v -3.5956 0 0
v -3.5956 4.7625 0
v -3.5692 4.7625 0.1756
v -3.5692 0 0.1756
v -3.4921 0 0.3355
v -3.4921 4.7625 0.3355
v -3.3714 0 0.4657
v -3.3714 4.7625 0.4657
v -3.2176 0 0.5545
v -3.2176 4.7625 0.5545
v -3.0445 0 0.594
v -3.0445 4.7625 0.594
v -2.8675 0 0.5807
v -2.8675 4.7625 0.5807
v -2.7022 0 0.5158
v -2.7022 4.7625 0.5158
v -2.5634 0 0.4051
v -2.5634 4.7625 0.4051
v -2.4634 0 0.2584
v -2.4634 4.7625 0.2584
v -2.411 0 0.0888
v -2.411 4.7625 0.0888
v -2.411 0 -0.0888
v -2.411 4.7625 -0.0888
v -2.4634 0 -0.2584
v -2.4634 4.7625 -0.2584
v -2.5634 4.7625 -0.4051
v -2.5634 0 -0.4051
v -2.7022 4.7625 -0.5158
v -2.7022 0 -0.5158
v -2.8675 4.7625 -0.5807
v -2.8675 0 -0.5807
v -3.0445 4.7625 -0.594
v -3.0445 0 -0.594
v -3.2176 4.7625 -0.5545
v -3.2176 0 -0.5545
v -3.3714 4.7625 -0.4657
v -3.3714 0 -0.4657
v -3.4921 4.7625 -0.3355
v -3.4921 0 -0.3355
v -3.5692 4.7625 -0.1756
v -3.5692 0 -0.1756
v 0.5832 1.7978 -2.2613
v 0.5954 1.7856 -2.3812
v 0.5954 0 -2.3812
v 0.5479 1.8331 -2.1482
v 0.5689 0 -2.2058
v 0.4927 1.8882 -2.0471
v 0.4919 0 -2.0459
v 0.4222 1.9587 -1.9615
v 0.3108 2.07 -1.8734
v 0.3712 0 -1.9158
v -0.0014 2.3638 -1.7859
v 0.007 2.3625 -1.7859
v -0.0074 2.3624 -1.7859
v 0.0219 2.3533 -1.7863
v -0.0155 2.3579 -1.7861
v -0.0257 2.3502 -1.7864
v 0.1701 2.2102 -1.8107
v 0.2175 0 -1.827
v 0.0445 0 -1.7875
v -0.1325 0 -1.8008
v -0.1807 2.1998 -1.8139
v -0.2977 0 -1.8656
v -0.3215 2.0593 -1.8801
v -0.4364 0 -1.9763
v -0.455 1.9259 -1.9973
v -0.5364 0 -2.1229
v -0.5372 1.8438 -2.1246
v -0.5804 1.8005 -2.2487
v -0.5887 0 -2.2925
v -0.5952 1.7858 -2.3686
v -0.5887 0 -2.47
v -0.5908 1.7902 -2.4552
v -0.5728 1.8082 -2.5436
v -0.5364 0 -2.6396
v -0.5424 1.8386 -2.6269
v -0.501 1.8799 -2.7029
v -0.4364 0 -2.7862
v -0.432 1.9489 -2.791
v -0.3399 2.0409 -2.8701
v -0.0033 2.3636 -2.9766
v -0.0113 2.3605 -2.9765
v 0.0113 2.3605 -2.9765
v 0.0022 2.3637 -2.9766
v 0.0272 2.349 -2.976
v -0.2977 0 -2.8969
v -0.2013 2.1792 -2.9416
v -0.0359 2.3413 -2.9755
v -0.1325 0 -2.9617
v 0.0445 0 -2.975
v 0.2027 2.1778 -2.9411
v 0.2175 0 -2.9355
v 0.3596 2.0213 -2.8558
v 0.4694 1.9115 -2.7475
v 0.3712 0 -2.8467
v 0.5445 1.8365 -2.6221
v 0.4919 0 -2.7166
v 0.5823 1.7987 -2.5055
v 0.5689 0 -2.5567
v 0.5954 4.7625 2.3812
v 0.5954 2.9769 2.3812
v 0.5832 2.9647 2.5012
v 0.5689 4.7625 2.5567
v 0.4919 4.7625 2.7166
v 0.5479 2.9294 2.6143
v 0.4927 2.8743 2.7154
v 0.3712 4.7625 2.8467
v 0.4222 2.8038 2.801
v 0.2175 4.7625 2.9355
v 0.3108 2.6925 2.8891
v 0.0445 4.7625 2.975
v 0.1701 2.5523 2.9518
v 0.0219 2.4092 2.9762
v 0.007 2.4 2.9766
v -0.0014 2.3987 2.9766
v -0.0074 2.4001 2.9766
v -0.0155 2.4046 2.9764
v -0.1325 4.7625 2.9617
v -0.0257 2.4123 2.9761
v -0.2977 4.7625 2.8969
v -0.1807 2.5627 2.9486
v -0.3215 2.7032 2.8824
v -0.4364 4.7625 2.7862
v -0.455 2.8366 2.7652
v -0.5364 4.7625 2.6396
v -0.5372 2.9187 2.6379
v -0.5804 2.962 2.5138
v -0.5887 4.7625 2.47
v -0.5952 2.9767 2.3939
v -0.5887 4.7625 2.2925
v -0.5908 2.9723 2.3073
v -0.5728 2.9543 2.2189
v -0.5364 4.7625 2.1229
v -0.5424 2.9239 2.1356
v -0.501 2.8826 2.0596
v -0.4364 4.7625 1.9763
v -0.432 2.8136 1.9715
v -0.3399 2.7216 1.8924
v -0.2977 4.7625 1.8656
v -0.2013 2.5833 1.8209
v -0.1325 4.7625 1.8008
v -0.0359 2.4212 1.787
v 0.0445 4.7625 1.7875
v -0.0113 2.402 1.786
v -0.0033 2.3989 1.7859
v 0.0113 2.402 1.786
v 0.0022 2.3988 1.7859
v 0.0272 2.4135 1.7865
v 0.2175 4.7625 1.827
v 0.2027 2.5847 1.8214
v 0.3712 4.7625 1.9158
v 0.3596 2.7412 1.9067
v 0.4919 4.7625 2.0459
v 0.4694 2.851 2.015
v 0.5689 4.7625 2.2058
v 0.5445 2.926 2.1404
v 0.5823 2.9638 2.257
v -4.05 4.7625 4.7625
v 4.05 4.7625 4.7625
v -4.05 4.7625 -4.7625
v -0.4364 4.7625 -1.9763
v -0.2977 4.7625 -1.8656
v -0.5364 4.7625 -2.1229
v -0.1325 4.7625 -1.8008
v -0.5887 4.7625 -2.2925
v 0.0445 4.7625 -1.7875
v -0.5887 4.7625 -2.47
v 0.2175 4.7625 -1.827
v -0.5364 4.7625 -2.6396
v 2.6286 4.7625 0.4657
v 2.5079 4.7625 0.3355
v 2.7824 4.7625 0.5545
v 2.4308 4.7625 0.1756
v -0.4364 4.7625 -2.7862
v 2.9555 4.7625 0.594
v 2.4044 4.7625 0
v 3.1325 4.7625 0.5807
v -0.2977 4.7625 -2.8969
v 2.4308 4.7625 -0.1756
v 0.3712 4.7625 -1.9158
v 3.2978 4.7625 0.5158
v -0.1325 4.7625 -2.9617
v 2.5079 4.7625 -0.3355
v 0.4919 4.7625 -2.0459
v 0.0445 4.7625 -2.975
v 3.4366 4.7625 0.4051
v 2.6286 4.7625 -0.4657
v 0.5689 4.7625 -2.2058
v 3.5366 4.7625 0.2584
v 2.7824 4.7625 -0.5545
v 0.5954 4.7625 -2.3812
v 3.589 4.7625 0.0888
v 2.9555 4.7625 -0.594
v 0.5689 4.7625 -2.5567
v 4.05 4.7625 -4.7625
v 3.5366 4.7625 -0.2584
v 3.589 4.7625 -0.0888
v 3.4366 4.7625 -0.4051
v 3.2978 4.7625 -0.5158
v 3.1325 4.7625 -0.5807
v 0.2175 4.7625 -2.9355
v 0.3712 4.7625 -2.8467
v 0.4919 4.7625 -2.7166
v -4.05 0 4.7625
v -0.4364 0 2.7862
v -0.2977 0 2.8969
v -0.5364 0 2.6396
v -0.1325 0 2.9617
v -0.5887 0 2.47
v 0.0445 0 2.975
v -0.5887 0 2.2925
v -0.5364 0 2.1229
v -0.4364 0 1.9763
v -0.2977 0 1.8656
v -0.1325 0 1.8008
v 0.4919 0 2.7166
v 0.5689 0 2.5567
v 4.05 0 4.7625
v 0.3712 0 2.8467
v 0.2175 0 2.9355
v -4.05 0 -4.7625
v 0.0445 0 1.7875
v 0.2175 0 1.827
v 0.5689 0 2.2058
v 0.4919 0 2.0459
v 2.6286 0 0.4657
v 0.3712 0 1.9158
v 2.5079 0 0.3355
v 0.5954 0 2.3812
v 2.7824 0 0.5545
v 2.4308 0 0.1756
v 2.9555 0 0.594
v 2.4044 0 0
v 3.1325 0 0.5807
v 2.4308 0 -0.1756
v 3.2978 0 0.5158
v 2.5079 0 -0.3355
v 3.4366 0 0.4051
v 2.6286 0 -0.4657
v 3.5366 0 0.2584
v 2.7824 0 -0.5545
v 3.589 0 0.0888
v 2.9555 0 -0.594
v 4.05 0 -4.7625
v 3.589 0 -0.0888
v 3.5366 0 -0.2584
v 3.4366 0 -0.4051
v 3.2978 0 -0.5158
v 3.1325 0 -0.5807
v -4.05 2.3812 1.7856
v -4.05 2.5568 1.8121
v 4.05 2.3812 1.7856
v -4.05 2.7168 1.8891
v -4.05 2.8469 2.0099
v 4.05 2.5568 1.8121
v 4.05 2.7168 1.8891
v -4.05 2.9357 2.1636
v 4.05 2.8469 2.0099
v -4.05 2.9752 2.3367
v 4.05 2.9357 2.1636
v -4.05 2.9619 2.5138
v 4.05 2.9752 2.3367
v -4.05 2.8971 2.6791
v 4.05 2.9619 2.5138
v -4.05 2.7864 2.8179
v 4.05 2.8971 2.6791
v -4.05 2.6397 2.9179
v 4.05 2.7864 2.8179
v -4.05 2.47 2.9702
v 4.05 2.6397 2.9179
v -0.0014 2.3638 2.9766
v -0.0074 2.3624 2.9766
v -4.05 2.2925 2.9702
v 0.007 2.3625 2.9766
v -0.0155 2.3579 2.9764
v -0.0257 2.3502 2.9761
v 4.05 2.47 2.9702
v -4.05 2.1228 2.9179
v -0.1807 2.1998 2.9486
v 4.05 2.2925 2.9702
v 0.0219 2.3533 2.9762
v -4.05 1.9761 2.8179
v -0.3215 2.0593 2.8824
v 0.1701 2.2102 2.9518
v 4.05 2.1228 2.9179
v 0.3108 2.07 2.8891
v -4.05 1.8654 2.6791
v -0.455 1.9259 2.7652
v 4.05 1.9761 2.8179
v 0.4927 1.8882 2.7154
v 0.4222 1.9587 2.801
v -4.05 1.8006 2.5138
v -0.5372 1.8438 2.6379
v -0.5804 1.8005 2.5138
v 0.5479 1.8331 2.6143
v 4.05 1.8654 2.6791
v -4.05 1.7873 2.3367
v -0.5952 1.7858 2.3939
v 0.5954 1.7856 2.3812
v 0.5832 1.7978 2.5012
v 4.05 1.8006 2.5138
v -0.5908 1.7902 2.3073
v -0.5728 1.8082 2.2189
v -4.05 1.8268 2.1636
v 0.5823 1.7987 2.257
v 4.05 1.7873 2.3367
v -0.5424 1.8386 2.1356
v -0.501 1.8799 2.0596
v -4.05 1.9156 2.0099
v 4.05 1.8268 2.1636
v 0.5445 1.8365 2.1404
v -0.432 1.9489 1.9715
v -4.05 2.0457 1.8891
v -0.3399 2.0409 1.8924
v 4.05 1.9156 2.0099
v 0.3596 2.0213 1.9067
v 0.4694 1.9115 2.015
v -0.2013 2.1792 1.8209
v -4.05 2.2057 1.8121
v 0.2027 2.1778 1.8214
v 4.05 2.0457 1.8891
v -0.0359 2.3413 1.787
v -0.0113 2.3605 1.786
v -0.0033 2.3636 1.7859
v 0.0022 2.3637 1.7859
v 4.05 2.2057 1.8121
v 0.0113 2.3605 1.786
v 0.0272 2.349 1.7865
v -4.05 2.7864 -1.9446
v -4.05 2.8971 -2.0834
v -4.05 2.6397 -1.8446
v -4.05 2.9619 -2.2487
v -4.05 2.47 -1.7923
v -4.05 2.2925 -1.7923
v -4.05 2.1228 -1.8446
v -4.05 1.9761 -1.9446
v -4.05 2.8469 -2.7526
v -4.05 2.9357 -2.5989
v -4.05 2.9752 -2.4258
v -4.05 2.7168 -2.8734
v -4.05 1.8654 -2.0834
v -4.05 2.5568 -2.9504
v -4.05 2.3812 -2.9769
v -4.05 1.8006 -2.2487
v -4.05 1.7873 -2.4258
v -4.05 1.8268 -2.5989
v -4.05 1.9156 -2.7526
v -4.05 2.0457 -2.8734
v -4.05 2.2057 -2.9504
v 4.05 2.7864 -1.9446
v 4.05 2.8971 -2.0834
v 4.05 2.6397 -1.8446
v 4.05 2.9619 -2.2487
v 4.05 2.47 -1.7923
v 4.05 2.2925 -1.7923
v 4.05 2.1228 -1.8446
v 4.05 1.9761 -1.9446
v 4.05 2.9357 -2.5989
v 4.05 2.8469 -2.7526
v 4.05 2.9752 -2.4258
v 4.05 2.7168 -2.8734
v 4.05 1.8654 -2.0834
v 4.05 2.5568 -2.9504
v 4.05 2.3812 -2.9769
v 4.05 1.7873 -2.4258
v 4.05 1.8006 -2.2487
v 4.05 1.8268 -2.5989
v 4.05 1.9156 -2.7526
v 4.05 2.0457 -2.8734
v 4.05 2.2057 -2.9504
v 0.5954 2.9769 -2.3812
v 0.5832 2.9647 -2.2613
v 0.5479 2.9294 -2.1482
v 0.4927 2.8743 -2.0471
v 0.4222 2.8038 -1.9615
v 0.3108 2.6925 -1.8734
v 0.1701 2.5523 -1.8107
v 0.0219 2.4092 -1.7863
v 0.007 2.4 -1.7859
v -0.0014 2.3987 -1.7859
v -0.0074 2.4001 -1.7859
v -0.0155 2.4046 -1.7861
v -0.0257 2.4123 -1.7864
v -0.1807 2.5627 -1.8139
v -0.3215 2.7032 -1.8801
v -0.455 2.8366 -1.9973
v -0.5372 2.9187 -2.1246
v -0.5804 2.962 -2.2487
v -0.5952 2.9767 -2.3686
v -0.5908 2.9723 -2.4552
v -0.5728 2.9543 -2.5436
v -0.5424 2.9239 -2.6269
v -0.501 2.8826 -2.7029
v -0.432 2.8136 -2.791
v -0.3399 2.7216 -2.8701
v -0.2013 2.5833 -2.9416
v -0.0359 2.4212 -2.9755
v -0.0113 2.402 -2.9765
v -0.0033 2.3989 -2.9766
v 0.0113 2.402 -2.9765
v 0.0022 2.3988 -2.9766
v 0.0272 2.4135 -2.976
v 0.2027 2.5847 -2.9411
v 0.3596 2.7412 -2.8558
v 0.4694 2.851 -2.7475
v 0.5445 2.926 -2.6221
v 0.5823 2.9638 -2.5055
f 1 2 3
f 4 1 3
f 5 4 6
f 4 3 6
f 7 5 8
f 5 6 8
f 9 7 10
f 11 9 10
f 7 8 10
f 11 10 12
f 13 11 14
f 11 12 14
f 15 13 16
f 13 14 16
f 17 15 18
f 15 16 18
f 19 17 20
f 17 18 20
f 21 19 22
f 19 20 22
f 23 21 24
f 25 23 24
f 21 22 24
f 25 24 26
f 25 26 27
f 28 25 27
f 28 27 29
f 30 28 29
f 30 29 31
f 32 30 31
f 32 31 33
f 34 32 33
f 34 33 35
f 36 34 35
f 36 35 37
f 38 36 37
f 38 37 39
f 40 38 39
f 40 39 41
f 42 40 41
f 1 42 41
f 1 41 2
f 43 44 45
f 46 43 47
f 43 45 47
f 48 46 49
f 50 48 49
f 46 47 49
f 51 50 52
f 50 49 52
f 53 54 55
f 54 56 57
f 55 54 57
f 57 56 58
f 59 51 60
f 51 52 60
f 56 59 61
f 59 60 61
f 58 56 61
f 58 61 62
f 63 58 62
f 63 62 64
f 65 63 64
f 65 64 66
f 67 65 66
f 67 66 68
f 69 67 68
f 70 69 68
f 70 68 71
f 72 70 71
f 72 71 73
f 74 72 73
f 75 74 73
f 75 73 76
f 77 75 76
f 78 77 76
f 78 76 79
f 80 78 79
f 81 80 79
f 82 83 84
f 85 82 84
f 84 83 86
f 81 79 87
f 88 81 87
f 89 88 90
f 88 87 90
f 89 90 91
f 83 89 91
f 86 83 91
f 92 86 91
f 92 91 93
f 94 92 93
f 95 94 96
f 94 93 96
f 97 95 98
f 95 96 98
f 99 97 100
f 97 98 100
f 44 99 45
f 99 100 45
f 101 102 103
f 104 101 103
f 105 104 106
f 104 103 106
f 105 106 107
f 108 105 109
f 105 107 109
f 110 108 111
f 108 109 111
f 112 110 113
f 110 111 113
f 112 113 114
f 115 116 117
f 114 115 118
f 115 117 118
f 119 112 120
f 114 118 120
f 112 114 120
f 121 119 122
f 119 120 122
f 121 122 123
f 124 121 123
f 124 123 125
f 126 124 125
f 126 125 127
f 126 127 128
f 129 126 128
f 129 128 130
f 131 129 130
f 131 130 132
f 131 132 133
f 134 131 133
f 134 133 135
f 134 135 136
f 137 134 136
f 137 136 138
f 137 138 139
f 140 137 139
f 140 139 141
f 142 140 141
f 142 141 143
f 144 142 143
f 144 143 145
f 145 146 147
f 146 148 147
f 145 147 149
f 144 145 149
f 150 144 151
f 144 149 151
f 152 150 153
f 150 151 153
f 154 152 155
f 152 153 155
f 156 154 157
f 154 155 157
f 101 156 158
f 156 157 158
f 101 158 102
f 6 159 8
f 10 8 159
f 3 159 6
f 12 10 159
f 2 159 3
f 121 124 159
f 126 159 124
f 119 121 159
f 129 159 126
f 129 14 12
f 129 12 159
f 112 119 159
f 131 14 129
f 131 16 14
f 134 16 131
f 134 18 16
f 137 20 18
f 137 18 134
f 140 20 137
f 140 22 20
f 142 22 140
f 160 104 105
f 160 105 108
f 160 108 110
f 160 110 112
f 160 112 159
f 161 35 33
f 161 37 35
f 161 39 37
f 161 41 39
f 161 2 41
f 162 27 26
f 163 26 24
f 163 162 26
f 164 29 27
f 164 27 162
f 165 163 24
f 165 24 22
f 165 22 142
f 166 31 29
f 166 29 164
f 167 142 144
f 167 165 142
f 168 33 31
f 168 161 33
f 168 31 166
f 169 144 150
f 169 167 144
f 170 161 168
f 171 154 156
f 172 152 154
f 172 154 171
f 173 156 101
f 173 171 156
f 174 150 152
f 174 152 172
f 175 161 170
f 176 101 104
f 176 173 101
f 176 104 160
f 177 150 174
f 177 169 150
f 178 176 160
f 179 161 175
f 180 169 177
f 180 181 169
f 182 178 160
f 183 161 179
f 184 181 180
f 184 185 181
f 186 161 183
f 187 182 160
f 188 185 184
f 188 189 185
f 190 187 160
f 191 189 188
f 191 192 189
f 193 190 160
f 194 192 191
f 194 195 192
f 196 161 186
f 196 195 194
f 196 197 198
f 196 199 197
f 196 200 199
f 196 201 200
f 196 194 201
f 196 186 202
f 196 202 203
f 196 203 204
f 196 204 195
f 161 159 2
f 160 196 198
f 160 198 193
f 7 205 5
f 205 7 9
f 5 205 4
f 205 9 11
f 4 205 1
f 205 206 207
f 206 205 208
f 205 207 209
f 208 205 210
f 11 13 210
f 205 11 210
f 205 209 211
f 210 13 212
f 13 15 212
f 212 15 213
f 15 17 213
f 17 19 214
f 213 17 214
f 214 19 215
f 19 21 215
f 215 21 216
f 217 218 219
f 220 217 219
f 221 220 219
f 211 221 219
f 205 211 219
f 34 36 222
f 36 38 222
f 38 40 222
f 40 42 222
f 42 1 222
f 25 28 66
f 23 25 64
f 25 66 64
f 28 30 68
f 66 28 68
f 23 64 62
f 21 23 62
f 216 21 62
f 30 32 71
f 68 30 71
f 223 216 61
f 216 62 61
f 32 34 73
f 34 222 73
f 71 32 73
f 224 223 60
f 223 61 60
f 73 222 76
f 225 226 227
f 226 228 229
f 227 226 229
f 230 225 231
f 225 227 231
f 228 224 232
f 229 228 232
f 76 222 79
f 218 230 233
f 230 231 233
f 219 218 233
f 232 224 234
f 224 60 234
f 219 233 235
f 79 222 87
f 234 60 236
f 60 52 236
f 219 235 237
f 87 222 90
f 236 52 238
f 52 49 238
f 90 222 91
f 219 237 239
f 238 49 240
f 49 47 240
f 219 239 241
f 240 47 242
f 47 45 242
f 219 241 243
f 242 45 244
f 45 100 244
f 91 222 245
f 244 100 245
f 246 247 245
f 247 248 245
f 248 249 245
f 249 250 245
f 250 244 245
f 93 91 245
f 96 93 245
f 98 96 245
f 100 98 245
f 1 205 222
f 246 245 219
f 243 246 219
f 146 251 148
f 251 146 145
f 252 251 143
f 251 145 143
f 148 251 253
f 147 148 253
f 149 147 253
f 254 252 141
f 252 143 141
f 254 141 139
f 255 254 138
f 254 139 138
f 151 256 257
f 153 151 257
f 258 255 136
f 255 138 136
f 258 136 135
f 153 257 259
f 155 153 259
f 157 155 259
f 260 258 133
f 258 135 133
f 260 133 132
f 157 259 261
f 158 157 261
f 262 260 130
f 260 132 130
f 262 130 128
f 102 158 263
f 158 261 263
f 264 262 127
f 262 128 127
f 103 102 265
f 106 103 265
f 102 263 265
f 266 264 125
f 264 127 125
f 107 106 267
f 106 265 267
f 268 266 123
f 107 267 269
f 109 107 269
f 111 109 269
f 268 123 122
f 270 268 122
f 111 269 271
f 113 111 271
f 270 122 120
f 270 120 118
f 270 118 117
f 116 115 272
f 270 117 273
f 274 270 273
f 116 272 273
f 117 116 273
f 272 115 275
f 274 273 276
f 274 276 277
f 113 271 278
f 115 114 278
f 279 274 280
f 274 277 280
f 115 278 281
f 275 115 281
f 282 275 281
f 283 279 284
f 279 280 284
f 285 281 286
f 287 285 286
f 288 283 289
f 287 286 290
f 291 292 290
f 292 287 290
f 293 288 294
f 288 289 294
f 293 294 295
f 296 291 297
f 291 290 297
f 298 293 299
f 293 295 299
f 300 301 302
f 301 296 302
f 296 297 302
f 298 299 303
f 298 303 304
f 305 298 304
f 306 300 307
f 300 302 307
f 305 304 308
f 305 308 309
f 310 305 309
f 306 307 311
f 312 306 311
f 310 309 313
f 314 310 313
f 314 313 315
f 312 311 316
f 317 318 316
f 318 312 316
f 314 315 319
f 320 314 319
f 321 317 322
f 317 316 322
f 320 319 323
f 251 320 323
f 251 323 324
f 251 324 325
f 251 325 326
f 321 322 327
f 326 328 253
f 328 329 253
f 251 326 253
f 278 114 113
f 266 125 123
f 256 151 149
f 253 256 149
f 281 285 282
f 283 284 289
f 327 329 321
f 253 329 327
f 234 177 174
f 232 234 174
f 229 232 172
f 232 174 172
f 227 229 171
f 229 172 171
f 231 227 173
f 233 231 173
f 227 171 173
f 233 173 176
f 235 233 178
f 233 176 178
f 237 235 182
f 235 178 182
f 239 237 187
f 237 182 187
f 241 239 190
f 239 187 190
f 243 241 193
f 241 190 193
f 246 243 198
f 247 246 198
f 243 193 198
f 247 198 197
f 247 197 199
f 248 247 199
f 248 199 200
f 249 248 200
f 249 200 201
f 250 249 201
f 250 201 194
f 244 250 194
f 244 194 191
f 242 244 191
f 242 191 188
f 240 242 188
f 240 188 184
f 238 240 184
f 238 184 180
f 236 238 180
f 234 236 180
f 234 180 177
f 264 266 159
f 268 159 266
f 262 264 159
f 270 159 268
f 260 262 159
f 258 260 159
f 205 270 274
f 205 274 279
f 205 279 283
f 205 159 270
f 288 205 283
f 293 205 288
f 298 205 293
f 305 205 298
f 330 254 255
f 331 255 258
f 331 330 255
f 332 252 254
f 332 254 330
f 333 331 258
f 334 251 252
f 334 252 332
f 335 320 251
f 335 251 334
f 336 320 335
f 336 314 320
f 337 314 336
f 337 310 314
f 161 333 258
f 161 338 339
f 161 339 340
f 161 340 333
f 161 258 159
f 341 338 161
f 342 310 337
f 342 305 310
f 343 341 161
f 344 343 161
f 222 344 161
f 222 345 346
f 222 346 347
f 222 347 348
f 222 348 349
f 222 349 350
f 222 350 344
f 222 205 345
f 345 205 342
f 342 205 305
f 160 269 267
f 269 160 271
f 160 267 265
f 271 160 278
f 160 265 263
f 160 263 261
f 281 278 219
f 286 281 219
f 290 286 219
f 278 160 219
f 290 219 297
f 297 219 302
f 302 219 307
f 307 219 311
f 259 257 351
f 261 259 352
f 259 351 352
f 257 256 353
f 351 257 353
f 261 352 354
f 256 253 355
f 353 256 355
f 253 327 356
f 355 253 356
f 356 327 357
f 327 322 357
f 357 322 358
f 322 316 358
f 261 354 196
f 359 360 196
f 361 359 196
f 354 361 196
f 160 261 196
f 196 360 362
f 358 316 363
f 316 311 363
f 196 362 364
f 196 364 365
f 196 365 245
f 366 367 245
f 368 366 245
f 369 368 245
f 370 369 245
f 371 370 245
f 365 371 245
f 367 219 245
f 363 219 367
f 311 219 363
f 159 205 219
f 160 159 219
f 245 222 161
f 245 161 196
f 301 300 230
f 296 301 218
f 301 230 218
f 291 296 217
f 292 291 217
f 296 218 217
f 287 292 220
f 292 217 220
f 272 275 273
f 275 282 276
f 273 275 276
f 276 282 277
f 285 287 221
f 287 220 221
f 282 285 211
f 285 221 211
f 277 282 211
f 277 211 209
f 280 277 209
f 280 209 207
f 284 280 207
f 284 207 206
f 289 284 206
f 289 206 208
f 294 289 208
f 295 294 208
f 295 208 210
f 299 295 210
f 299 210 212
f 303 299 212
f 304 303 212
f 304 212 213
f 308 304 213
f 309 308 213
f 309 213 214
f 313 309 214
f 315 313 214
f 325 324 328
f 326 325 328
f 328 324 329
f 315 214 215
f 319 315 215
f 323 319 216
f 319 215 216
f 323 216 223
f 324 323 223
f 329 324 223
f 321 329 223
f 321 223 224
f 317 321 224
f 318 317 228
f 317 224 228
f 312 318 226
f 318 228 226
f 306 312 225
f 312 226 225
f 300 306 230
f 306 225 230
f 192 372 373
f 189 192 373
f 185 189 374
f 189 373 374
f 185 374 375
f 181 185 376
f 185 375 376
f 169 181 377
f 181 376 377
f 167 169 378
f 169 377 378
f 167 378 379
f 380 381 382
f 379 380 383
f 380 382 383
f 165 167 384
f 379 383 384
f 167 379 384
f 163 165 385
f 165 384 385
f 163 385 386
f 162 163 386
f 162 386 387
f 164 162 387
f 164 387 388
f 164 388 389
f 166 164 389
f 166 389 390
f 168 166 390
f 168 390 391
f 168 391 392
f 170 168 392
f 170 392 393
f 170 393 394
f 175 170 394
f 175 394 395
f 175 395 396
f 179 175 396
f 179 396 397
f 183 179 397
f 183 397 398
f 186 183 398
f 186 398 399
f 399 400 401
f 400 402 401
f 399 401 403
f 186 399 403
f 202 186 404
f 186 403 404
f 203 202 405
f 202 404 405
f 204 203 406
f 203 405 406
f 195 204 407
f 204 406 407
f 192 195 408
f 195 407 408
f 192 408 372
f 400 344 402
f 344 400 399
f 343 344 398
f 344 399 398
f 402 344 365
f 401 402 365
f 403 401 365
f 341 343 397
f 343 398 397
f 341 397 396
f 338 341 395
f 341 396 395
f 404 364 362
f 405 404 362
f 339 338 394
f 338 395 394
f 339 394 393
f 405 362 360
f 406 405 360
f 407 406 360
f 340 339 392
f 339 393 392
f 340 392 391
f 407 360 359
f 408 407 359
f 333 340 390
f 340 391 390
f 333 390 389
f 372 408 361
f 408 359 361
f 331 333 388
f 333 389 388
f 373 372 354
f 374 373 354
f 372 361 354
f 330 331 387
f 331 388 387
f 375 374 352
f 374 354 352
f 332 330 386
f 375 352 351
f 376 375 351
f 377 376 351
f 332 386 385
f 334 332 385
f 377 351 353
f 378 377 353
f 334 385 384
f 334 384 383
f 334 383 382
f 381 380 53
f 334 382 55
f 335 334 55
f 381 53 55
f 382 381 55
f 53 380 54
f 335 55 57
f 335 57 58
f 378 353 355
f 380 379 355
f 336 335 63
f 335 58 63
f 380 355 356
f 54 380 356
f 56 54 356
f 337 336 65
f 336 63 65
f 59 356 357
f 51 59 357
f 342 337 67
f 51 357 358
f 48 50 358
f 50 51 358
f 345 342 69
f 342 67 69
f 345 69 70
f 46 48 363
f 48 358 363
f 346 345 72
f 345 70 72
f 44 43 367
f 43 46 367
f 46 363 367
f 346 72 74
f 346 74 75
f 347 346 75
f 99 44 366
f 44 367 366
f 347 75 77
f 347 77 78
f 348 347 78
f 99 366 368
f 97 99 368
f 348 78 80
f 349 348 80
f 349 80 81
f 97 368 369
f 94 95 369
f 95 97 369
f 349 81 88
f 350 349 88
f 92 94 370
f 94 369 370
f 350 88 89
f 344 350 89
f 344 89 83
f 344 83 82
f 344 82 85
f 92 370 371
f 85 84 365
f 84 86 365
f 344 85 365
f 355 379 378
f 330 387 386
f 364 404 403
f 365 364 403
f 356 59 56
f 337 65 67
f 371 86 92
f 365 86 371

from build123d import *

# Parameters (mm, degrees)
SKETCH1_W                           = 8.1
SKETCH1_H                           = 9.525
BOSS_EXTRUDE1_DEPTH                 = 4.7625
F_0_80_TAPPED_HOLE1_D               = 1.19126
F_0_80_TAPPED_HOLE2_D               = 1.19126
F_3_64_0_04688_DIAMETER_HOLE1_D     = 1.190752
F_3_64_0_04688_DIAMETER_HOLE1_DEPTH = 12.954
F_3_64_0_04688_DIAMETER_HOLE1_TIP   = 0.357737992


with BuildPart() as part:
    # Sketch1 → Boss-Extrude1 (new body)
    with BuildSketch(Plane(origin=(0, 0, 0), x_dir=(1, 0, 0), z_dir=(0, 1, 0))):
        Rectangle(SKETCH1_W, SKETCH1_H)
    extrude(amount=BOSS_EXTRUDE1_DEPTH)

    # #0-80 Tapped Hole1 (through all)
    with Locations(Plane.ZY.offset(4.05)):
        with Locations((-2.38125, 2.38125), (2.38125, 2.38125)):
            Hole(F_0_80_TAPPED_HOLE1_D / 2)

    # #0-80 Tapped Hole2 (through all)
    with Locations(Plane.XZ):
        with Locations((-3, 0), (3, 0)):
            Hole(F_0_80_TAPPED_HOLE2_D / 2)

    # 3/64 (0.04688) Diameter Hole1
    with Locations(Plane(origin=(0, 4.7625, 0), x_dir=(-1, 0, 0), z_dir=(0, 1, 0))):
        with Locations((0, 2.38125), (0, -2.38125)):
            Hole(F_3_64_0_04688_DIAMETER_HOLE1_D / 2, depth=F_3_64_0_04688_DIAMETER_HOLE1_DEPTH)
            with Locations((0, 0, -(F_3_64_0_04688_DIAMETER_HOLE1_DEPTH + F_3_64_0_04688_DIAMETER_HOLE1_TIP / 2))):  # 118° drill point
                Cone(0, F_3_64_0_04688_DIAMETER_HOLE1_D / 2, F_3_64_0_04688_DIAMETER_HOLE1_TIP, mode=Mode.SUBTRACT)


solid = part.part
